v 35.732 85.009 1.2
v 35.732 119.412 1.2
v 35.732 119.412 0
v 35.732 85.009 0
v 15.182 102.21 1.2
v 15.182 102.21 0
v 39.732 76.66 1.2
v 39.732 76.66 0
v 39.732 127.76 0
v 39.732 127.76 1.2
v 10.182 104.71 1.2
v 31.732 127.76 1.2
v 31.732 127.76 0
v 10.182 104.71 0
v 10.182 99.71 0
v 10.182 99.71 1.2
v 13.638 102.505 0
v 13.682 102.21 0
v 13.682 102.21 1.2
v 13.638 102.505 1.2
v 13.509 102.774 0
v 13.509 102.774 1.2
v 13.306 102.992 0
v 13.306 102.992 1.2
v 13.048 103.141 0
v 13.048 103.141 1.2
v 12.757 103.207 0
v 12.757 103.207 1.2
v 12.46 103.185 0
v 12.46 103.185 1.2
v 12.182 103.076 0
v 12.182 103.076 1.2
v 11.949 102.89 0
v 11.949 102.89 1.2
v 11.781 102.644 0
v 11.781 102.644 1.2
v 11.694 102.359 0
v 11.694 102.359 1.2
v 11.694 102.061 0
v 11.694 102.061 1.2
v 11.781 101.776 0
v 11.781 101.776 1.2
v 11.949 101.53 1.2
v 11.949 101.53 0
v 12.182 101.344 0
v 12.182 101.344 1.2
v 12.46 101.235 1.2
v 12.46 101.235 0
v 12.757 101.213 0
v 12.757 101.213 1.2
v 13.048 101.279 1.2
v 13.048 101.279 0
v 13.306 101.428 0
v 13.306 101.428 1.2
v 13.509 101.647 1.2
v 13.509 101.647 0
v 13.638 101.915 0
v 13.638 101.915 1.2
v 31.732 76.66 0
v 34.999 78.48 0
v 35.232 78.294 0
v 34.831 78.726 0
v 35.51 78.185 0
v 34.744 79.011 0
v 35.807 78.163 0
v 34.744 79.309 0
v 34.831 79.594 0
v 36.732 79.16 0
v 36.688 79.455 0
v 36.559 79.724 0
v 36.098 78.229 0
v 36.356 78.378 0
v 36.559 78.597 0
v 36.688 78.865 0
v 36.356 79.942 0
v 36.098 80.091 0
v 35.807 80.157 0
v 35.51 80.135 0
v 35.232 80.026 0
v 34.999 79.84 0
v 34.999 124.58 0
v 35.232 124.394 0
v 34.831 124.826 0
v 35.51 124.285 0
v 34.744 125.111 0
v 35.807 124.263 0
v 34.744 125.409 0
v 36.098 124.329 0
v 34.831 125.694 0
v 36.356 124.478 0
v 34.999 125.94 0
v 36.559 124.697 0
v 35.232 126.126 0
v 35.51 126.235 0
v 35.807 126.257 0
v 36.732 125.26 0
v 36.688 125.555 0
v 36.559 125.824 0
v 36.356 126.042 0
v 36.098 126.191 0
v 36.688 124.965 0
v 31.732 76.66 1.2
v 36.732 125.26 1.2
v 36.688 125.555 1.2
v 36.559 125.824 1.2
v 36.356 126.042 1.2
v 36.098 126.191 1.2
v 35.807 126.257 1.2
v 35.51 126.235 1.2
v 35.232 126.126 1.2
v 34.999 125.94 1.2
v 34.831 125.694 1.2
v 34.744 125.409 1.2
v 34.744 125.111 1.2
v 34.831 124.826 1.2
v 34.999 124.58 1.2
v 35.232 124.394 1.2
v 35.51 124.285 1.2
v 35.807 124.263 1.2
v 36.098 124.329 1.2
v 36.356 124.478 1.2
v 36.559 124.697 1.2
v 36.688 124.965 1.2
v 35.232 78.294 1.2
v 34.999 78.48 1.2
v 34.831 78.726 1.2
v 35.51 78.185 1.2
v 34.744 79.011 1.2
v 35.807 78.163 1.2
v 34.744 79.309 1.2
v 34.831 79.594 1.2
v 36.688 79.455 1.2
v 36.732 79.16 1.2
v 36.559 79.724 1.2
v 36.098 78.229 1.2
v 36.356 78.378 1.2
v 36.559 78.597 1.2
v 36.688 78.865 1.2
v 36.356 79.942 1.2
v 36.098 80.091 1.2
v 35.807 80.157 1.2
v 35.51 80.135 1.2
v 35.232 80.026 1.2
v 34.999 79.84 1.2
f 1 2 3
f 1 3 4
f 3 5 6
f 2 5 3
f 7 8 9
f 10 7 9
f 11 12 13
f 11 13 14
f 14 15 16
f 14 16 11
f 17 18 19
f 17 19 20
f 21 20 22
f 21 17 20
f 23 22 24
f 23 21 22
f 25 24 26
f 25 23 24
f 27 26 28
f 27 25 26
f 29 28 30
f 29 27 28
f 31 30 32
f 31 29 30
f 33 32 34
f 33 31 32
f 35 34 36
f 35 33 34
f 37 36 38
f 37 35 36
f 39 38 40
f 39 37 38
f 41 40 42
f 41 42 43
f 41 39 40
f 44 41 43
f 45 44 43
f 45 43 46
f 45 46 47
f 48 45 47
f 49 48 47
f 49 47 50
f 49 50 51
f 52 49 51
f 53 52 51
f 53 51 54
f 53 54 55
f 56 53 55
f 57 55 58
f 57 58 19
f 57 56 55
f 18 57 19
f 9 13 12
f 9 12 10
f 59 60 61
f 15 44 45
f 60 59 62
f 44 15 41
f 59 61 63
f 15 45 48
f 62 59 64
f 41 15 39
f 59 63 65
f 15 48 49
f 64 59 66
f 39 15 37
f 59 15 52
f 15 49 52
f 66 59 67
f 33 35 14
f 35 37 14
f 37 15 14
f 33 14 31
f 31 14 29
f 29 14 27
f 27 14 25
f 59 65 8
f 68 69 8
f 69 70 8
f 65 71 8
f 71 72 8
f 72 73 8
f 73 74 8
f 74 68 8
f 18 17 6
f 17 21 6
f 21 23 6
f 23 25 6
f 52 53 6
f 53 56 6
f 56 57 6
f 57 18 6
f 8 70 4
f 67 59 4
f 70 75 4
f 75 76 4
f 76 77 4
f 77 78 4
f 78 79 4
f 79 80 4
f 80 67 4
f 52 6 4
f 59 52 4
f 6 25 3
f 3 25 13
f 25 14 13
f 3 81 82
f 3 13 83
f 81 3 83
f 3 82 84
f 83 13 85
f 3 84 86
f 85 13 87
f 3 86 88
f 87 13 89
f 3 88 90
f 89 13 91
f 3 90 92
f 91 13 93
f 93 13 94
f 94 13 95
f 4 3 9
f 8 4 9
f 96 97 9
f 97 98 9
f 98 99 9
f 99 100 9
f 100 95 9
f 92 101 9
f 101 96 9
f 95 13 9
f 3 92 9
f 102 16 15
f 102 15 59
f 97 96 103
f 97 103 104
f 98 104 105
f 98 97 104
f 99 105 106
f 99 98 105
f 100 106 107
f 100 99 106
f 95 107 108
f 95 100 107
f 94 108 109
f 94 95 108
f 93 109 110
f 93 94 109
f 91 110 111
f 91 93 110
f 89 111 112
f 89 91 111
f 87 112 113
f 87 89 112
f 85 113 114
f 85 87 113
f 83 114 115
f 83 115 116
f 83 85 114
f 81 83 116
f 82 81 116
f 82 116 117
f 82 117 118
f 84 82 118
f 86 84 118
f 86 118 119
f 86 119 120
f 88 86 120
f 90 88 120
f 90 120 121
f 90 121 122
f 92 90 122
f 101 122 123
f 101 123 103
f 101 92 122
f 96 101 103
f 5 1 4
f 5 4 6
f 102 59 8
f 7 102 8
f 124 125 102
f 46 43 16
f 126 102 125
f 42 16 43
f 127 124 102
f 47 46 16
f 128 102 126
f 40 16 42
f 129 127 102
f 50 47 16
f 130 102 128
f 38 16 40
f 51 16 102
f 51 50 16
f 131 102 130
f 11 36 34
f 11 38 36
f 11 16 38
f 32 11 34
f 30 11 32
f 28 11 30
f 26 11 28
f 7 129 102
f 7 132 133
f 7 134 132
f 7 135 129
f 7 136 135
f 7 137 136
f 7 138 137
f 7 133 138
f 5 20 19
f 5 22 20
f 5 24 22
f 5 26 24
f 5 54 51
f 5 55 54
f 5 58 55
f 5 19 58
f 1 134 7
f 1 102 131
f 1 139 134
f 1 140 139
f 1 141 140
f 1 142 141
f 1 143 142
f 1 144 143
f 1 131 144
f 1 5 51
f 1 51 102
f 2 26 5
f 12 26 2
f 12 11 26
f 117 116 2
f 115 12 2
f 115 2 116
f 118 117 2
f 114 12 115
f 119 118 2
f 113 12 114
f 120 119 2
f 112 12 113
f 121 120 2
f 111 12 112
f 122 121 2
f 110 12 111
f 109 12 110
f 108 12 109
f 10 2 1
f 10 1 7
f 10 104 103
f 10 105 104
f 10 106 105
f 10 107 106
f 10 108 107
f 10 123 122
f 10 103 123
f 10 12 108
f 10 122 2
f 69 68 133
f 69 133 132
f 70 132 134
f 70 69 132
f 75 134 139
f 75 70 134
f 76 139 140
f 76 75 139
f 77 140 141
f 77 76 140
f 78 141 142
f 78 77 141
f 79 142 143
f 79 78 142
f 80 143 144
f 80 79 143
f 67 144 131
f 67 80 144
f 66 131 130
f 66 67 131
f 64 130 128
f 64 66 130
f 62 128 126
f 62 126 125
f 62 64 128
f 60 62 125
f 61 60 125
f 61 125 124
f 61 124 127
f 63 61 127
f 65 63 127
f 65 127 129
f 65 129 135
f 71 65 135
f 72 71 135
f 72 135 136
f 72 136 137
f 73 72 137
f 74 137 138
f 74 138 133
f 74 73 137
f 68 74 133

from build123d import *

# Parameters (mm, degrees)
SKETCH1_W             = 8
SKETCH1_H             = 5
SKETCH1_R             = 1
BOSS_EXTRUDE1_DEPTH   = 1.2
SKETCH1_W_2           = 5
BOSS_EXTRUDE1_2_DEPTH = 1.2
BOSS_EXTRUDE1_3_DEPTH = 1.2
SKETCH2_W             = 5
SKETCH2_H             = 5
SKETCH2_R             = 1
BOSS_EXTRUDE4_DEPTH   = 1.2


with BuildPart() as part:
    # Sketch1 → Boss-Extrude1 (new body)
    with BuildSketch(Plane.XY):
        with Locations((35.73242964, 79.160231922)):
            Rectangle(SKETCH1_W, SKETCH1_H)
        with Locations((35.73242964, 79.160231922)):
            Circle(SKETCH1_R, mode=Mode.SUBTRACT)
    extrude(amount=BOSS_EXTRUDE1_DEPTH)



with BuildPart() as body_2:
    # Sketch1 → Boss-Extrude1 2 (new body)
    with BuildSketch(Plane.XY):
        with Locations((12.68242964, 102.210231922)):
            Rectangle(SKETCH1_W_2, SKETCH1_H)
        with Locations((12.68242964, 102.210231922)):
            Circle(SKETCH1_R, mode=Mode.SUBTRACT)
    extrude(amount=BOSS_EXTRUDE1_2_DEPTH)


with BuildPart() as body_3:
    # Sketch1 → Boss-Extrude1 3 (new body)
    with BuildSketch(Plane.XY):
        with Locations((35.73242964, 125.260231922)):
            Rectangle(SKETCH1_W, SKETCH1_H)
        with Locations((35.73242964, 125.260231922)):
            Circle(SKETCH1_R, mode=Mode.SUBTRACT)
    extrude(amount=BOSS_EXTRUDE1_3_DEPTH)


with BuildPart() as part_1:
    add(part.part)

    add(body_2.part)  # Boss-Extrude4 merges body 2

    add(body_3.part)  # Boss-Extrude4 merges body 3
    # Sketch2 → Boss-Extrude4 (add)
    # profile 1 of 6: a face of its own
    with BuildSketch(Plane.XY.offset(1.2)):
        Polygon((15.18242964, 99.710231922), (10.18242964, 99.710231922), (31.73242964, 76.660231922), (31.73242964, 81.660231922), (35.73242964, 81.660231922), (35.73242964, 85.008500761), (15.18242964, 102.210231922), align=None)
    # profile 2 of 6: a face of its own
    with BuildSketch(Plane.XY.offset(1.2)):
        Polygon((31.73242964, 127.760231922), (10.18242964, 104.710231922), (15.18242964, 104.710231922), (15.18242964, 102.210231922), (35.73242964, 119.411963083), (35.73242964, 122.760231922), (31.73242964, 122.760231922), align=None)
    # profile 3 of 6: a face of its own
    with BuildSketch(Plane.XY.offset(1.2)):
        with Locations((12.68242964, 102.210231922)):
            Rectangle(SKETCH2_W, SKETCH2_H)
        with Locations((12.68242964, 102.210231922)):
            Circle(SKETCH2_R, mode=Mode.SUBTRACT)
    # profile 4 of 6: a face of its own
    with BuildSketch(Plane.XY.offset(1.2)):
        Polygon((35.73242964, 119.411963083), (35.73242964, 85.008500761), (39.73242964, 81.660231922), (39.73242964, 122.760231922), align=None)
    # profile 5 of 6: a face of its own
    with BuildSketch(Plane.XY.offset(1.2)):
        Polygon((35.73242964, 122.760231922), (35.73242964, 119.411963083), (39.73242964, 122.760231922), align=None)
    # profile 6 of 6: a face of its own
    with BuildSketch(Plane.XY.offset(1.2)):
        Polygon((35.73242964, 85.008500761), (35.73242964, 81.660231922), (39.73242964, 81.660231922), align=None)
    extrude(amount=-BOSS_EXTRUDE4_DEPTH)


solid = part_1.part
